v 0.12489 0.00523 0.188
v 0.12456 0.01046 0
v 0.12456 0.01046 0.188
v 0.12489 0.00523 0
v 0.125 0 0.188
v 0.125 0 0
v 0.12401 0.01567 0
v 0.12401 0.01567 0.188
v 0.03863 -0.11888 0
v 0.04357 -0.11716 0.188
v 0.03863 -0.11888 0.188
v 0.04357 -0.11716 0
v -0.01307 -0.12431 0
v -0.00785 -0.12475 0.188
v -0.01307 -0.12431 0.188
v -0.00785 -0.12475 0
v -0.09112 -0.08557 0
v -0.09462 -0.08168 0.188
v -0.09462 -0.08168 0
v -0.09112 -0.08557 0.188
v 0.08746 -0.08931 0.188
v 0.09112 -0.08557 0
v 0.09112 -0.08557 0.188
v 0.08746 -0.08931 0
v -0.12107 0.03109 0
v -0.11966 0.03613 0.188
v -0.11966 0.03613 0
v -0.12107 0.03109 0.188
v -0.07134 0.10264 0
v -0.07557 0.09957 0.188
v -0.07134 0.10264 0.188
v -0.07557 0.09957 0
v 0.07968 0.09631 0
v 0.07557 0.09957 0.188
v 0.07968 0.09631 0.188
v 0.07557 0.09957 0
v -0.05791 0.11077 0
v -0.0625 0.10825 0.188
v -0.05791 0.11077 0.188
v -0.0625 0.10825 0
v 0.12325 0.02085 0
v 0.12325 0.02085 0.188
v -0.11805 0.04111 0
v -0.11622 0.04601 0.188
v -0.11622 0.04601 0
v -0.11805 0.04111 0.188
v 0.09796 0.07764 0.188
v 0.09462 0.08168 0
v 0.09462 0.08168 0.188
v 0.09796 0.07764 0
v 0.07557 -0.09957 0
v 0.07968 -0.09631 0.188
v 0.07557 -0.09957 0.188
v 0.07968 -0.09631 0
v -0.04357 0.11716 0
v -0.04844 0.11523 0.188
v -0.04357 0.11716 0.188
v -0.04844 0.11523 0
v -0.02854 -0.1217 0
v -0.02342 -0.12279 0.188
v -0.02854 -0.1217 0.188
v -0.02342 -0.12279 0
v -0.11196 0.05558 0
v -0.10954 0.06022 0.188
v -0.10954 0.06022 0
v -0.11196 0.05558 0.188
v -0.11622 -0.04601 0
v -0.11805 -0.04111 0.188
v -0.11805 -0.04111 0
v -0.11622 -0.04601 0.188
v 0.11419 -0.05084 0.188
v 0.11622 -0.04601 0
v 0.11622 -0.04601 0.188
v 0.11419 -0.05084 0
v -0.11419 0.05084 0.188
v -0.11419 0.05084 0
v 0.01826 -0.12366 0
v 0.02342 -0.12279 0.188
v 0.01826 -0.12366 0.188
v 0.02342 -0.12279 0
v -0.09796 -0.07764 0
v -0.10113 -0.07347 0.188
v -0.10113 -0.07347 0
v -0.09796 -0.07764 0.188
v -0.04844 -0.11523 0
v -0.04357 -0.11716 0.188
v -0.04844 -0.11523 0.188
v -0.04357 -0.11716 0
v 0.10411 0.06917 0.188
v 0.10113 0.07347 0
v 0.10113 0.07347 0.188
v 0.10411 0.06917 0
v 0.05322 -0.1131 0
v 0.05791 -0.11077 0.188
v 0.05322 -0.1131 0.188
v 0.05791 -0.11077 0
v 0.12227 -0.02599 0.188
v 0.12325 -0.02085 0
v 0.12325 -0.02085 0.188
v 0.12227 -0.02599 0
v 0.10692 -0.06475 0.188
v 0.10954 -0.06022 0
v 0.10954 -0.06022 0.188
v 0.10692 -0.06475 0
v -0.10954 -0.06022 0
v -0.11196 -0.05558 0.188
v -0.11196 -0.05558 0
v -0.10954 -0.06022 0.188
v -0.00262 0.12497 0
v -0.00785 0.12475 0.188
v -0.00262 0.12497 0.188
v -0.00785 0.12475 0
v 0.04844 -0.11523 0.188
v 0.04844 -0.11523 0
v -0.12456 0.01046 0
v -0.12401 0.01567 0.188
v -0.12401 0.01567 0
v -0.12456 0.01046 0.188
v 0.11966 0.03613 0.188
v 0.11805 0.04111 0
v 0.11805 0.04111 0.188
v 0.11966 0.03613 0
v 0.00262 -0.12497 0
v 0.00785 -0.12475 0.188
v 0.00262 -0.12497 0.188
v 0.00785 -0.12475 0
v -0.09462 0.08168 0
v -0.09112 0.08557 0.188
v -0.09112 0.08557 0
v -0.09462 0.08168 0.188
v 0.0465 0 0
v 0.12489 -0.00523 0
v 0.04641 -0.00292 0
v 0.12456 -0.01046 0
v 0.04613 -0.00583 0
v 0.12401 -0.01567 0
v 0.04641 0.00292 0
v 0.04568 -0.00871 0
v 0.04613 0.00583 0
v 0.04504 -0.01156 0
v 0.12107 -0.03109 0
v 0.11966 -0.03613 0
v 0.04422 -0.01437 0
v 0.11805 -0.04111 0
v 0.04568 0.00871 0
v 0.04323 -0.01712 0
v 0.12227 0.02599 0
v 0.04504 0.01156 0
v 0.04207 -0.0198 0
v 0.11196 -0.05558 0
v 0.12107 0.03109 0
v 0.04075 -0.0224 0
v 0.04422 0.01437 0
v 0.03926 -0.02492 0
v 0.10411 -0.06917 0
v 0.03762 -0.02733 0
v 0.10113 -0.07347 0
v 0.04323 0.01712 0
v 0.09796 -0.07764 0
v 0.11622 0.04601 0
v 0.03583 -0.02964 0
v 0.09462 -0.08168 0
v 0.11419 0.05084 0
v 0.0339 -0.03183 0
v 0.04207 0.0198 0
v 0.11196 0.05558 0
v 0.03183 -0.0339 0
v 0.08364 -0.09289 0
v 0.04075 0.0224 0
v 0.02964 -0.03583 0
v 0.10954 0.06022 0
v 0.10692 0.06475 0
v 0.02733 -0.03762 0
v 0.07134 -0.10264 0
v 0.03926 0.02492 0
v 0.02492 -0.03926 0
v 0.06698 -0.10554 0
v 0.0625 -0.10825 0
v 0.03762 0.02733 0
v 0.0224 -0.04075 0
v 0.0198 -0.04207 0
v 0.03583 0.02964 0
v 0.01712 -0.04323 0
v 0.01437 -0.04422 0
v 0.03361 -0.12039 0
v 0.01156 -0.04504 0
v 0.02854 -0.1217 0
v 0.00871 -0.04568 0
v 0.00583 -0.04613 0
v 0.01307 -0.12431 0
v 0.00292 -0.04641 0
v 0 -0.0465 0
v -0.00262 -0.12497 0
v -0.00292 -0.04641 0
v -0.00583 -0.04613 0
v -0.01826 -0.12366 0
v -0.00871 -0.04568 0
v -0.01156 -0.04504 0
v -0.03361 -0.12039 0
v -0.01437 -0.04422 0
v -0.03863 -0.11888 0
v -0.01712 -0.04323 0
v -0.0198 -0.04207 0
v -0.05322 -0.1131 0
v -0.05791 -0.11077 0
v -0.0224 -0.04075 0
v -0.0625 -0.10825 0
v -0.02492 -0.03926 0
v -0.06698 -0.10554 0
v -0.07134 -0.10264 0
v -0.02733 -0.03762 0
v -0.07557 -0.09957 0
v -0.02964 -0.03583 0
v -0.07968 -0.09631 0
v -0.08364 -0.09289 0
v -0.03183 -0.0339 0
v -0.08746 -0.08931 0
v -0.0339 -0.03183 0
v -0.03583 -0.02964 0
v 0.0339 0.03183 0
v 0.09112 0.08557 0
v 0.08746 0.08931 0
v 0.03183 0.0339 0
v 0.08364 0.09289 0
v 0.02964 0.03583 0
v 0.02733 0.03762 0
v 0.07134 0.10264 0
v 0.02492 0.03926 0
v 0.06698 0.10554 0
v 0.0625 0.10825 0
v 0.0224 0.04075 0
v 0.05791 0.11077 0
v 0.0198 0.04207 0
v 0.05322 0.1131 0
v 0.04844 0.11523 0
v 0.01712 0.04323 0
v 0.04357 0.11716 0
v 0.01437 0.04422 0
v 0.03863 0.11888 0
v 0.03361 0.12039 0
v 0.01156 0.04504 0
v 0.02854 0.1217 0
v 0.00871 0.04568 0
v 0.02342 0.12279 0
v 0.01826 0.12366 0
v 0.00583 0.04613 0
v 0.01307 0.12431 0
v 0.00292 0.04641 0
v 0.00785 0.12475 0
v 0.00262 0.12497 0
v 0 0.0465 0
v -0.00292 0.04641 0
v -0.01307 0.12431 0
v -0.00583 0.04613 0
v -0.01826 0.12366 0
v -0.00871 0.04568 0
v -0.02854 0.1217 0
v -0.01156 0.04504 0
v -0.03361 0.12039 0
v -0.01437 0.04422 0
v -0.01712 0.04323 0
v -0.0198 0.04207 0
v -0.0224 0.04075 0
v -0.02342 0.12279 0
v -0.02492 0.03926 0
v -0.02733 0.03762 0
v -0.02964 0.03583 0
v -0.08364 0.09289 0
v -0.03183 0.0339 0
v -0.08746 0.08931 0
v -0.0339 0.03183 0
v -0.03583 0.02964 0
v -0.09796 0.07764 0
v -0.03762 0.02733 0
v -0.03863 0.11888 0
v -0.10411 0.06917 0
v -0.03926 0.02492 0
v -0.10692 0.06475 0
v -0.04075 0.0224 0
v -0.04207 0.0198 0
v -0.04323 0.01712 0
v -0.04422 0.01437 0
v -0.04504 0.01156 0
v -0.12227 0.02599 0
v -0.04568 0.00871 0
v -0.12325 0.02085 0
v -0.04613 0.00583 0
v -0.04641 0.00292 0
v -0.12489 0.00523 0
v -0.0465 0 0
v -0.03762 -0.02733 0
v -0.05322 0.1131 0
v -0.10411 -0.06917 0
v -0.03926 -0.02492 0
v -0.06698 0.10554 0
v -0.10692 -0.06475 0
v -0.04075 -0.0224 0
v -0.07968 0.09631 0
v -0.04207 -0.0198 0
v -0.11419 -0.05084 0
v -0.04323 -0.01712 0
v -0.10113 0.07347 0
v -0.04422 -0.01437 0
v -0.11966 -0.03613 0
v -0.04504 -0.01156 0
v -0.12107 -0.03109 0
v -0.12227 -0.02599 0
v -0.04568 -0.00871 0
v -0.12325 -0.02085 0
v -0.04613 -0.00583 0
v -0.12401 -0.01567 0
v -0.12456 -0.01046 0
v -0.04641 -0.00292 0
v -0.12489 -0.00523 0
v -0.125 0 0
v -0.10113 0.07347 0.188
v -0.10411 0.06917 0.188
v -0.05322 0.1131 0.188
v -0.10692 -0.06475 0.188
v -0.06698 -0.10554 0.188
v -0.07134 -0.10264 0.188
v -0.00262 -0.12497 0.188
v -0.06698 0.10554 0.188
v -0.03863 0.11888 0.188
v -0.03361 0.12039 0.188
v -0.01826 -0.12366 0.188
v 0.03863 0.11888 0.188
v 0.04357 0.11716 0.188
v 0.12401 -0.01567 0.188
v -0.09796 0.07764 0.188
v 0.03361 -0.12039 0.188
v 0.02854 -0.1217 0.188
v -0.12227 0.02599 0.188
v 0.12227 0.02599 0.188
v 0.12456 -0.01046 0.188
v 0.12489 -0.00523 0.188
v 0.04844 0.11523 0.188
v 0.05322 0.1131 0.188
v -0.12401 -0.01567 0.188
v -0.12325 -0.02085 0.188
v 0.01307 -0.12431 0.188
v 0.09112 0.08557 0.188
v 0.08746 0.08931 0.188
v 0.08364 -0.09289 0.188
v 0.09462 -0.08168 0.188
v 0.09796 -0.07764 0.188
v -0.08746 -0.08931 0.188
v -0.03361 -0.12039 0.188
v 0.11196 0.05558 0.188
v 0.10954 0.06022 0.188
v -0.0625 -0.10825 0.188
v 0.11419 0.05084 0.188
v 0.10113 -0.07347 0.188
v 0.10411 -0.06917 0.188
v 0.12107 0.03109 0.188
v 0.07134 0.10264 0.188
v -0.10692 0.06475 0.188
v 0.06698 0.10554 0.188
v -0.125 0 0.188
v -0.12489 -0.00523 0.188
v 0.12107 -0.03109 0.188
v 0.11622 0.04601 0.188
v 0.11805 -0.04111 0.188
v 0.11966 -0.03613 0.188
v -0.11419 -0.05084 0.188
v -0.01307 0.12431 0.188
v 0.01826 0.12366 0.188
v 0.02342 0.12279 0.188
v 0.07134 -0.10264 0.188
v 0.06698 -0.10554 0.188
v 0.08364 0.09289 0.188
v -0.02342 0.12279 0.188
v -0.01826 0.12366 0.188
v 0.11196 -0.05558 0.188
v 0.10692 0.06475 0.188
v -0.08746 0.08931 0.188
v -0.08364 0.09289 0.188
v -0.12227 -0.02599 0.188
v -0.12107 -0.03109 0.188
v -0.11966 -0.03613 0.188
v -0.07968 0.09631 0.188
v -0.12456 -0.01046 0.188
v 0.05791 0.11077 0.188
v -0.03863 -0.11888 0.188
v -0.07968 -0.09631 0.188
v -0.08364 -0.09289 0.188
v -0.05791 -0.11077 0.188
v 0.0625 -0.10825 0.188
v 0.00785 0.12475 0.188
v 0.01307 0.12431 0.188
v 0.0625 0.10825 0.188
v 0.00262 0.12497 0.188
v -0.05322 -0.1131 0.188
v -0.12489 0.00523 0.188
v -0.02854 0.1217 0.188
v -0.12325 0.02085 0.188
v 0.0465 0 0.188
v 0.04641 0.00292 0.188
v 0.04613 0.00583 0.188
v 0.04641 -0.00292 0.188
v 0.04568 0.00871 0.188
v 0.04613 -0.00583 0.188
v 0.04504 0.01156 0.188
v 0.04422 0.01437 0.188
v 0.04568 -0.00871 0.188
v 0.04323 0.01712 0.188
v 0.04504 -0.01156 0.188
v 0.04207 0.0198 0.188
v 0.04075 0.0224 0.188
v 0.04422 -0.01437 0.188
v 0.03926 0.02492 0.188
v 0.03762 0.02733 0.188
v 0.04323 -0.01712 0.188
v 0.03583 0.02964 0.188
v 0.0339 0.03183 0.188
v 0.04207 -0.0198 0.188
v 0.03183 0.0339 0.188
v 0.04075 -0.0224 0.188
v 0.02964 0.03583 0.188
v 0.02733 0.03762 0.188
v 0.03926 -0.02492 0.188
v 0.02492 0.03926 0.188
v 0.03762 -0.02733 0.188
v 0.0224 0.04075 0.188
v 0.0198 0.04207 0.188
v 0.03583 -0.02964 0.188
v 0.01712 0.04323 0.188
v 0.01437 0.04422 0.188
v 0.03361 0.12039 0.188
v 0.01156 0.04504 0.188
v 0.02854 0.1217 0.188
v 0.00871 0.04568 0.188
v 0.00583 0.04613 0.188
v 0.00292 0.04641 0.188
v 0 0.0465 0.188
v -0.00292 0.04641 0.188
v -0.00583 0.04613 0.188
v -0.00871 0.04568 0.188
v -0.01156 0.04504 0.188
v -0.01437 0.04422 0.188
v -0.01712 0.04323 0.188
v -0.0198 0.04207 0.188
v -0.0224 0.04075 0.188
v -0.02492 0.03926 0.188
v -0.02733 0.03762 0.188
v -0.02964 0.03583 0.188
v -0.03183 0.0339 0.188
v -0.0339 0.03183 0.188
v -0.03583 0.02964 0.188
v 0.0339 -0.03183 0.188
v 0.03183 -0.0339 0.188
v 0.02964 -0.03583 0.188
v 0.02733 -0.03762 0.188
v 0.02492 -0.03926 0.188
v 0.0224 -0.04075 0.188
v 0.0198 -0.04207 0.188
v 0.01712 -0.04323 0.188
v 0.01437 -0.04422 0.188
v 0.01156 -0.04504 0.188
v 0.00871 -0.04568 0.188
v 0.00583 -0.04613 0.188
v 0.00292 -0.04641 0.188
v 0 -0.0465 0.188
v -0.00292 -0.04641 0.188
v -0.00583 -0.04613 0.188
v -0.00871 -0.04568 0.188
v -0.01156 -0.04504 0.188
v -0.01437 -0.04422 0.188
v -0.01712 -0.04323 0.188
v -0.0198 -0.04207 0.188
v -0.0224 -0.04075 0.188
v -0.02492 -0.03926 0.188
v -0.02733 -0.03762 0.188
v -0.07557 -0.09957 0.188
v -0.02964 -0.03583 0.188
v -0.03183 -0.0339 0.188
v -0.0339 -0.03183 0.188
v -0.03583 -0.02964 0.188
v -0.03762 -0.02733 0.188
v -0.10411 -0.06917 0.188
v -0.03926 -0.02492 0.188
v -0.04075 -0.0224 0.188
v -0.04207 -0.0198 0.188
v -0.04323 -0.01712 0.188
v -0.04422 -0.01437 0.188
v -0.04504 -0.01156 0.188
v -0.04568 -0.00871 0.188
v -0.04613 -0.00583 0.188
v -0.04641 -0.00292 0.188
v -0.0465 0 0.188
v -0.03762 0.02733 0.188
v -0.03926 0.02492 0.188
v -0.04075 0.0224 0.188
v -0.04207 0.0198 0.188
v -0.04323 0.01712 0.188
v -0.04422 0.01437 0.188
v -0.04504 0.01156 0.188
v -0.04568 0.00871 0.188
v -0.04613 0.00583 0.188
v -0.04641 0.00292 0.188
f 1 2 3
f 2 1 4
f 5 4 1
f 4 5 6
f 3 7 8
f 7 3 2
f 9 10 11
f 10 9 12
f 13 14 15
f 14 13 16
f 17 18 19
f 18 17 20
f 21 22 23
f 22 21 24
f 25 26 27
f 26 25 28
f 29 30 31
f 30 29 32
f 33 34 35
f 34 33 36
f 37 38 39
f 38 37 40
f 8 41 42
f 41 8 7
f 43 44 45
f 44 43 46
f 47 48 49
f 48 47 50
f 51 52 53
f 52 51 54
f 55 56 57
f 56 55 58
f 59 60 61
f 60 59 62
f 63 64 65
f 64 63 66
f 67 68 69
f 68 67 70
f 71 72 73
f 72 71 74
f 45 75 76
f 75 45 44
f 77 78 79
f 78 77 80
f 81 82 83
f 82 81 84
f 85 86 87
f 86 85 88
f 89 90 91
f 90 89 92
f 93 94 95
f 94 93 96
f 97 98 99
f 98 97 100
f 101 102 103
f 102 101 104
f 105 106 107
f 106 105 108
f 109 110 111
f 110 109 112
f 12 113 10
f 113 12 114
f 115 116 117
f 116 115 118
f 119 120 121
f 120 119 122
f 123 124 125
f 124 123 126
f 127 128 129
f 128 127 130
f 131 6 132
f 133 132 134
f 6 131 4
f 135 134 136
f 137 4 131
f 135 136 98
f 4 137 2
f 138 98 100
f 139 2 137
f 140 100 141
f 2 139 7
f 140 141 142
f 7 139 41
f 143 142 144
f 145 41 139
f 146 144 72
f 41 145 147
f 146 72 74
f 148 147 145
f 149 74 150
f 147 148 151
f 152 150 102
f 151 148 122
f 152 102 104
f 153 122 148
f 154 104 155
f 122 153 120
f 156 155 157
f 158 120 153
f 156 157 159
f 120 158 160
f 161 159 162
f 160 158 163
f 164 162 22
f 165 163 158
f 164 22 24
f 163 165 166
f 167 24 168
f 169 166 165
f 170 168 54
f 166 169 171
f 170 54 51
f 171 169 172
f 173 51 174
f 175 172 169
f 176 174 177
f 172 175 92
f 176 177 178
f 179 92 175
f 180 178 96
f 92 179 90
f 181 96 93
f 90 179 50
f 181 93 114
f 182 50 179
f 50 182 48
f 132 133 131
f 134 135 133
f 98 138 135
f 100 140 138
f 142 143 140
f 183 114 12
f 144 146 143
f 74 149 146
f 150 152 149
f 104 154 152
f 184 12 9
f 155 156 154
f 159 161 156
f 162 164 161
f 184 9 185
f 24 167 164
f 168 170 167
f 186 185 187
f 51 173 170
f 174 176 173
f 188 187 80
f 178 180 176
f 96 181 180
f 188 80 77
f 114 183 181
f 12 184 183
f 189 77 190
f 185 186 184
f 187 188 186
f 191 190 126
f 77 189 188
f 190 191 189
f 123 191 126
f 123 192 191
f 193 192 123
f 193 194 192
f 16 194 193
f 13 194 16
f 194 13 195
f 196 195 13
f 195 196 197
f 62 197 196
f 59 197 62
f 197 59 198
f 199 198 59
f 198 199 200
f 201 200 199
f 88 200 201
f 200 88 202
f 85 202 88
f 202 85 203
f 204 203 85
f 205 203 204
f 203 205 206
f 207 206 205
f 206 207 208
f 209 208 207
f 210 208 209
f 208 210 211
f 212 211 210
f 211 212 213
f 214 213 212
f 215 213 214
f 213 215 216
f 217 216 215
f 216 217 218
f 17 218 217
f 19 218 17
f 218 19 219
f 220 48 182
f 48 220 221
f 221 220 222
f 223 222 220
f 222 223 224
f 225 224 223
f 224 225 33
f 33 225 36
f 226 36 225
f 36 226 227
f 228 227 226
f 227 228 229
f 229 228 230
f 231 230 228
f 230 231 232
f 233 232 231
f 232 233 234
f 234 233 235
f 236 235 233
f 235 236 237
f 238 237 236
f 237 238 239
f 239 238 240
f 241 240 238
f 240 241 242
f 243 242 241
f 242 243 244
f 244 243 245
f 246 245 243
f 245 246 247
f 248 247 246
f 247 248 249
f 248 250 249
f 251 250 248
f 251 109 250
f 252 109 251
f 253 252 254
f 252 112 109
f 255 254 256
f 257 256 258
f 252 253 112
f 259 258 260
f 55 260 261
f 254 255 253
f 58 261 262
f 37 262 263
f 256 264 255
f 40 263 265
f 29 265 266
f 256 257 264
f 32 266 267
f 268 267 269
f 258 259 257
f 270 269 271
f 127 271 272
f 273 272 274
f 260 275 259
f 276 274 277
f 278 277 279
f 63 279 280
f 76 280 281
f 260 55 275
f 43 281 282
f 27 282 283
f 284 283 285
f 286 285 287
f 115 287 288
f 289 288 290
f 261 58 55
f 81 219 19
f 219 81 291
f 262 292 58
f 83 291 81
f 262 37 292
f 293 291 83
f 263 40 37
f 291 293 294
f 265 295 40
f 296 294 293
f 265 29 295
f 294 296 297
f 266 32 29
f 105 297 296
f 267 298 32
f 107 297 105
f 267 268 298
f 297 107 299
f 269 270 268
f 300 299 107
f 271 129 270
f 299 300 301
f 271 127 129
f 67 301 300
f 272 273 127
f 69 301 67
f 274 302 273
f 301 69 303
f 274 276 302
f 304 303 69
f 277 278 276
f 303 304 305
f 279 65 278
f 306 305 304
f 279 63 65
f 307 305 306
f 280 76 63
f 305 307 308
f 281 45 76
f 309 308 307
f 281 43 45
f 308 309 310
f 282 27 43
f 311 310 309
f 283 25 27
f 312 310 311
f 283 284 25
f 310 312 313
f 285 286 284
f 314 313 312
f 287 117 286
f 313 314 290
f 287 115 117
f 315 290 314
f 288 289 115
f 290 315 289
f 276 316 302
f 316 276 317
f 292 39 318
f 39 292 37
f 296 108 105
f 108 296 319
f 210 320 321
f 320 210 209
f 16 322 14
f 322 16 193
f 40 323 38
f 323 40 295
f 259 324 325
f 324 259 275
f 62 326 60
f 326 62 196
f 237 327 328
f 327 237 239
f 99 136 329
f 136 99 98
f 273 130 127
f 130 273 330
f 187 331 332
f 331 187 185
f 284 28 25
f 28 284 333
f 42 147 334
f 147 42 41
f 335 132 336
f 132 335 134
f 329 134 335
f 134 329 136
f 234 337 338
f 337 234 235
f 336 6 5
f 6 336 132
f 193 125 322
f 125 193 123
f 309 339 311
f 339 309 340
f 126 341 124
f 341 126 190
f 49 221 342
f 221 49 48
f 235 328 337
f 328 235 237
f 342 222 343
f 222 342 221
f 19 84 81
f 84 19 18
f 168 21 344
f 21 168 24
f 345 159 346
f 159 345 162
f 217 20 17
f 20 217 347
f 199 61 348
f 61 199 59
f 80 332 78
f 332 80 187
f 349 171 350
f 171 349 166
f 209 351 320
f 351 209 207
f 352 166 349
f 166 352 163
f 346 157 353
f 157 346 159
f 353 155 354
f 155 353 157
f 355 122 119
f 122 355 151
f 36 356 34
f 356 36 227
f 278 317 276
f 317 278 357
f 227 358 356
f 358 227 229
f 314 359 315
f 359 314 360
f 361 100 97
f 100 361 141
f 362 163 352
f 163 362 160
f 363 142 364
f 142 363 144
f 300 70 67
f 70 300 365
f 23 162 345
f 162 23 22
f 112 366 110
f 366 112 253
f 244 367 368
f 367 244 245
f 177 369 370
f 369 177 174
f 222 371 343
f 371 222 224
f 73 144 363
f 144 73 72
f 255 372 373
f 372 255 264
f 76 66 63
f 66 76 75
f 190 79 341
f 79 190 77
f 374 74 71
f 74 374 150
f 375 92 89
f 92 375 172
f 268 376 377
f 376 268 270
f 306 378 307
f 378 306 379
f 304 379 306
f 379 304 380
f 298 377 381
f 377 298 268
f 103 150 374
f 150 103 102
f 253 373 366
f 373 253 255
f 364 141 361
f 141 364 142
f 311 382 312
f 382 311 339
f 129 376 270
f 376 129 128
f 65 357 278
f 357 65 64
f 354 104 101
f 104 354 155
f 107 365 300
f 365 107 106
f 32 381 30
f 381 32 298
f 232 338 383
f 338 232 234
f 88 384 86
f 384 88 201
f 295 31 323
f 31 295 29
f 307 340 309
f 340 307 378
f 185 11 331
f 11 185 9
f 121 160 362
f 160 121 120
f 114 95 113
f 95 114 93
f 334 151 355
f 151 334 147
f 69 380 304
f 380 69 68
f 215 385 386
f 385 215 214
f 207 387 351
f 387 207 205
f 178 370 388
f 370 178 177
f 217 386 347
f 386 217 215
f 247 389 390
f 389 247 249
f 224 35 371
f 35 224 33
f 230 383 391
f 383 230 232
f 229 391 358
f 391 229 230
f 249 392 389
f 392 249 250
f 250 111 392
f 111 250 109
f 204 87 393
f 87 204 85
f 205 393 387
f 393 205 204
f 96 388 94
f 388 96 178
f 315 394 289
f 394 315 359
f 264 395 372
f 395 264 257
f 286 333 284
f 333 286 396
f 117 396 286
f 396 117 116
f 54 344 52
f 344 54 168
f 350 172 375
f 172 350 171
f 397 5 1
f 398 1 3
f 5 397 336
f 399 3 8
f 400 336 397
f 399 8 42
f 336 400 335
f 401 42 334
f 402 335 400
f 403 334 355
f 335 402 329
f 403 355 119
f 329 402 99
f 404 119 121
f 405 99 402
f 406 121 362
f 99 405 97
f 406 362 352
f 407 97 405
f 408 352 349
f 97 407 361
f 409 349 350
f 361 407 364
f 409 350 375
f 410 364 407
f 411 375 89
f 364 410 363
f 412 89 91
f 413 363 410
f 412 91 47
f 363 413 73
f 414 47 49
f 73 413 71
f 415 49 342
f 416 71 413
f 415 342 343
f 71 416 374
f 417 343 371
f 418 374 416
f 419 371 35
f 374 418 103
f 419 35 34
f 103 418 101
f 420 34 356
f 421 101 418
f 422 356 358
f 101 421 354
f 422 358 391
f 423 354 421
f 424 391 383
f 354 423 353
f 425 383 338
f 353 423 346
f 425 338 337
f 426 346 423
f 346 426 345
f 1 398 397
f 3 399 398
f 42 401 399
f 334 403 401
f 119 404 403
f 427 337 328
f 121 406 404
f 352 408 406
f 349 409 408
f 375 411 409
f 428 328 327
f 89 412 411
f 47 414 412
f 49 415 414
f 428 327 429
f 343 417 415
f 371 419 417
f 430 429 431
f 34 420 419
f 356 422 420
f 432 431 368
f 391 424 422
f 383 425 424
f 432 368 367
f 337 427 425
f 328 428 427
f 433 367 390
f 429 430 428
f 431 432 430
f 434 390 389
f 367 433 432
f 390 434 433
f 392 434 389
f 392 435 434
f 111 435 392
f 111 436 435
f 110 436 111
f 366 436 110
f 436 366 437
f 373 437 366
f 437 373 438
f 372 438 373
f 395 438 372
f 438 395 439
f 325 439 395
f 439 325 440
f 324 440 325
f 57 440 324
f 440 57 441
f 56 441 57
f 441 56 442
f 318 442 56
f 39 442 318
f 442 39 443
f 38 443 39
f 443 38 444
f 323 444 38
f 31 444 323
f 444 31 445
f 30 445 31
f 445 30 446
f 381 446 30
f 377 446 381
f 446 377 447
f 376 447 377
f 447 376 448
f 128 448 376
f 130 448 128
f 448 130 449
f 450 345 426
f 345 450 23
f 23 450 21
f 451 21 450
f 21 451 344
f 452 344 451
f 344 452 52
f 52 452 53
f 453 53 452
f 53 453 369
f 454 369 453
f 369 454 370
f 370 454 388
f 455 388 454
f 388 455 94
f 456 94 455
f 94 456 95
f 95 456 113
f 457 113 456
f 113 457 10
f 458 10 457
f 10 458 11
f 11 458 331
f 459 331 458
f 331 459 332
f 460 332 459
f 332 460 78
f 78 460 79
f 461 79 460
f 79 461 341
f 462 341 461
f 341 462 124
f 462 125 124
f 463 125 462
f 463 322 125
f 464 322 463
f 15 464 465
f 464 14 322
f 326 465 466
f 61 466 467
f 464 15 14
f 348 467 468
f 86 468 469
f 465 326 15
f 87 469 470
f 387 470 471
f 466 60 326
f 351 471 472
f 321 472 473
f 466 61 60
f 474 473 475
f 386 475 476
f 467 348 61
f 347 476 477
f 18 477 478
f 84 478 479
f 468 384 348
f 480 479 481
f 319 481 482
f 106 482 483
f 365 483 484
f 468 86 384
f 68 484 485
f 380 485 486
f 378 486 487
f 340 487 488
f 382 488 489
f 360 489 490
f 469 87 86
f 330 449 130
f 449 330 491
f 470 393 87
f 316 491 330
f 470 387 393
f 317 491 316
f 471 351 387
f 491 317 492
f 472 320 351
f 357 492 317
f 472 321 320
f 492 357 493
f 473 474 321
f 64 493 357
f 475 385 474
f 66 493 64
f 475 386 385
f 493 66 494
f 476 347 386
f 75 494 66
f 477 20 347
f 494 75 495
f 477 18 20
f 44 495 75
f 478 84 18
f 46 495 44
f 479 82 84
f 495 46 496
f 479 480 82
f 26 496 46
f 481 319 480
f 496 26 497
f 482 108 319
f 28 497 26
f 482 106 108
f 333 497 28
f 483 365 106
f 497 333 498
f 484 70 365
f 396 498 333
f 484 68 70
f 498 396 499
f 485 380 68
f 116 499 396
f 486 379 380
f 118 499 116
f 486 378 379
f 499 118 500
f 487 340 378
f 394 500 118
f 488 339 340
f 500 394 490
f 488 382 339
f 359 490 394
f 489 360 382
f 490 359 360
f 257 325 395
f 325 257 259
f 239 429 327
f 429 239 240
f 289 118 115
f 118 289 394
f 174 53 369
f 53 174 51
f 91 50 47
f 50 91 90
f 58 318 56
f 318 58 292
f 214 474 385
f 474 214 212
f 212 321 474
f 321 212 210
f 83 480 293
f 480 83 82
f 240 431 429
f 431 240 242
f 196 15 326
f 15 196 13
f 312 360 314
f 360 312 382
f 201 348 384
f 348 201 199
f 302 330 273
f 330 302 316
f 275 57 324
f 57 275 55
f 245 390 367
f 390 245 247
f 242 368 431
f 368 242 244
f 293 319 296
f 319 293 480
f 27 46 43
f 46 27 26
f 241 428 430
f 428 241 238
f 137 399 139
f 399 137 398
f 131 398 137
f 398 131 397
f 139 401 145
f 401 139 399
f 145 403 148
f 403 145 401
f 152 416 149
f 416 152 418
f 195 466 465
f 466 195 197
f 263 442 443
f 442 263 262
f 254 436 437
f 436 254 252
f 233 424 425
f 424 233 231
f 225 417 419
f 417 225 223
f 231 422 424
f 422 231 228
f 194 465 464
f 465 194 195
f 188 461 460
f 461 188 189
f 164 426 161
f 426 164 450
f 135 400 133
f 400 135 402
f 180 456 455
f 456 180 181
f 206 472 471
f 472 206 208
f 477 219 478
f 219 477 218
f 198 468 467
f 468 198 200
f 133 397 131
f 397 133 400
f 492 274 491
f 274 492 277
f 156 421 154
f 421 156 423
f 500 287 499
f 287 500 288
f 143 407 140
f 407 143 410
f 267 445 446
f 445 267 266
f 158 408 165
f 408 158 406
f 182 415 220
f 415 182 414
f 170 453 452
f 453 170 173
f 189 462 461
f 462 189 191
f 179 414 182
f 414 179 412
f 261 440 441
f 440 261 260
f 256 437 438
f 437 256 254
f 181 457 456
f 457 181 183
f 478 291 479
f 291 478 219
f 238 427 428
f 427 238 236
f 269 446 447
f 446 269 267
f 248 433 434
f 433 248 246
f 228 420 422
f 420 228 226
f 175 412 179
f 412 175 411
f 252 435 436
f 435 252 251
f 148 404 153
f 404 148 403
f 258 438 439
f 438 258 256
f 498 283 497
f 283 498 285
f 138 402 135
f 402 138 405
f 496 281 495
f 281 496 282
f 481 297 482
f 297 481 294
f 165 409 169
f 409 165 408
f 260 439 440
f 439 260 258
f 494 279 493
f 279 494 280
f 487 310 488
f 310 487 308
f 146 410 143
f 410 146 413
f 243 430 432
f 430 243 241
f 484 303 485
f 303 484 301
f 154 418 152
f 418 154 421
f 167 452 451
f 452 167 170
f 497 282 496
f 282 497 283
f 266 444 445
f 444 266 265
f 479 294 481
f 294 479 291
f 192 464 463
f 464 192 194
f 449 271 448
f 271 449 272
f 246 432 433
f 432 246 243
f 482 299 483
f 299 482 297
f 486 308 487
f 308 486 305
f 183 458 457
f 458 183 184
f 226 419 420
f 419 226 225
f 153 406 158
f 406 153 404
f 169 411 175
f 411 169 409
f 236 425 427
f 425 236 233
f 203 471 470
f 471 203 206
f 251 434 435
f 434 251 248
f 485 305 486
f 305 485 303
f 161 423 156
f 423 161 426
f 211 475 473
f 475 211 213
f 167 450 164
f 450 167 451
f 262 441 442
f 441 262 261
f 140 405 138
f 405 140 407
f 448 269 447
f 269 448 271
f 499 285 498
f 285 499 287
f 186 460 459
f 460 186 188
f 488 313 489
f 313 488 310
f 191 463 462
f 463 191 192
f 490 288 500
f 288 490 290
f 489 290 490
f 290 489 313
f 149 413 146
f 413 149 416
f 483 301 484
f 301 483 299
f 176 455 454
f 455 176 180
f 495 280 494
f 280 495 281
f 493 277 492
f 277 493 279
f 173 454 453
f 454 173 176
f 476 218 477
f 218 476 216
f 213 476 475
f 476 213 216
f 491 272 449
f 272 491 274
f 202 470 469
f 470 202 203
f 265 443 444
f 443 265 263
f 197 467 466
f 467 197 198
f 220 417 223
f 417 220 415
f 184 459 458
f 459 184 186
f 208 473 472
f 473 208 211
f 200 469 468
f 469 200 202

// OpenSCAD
// Gear32
//
// Tooth spacing 2.500 mm
// Contact angle 20 degrees
// Addendum 0.250 mm
// Diametric pitch 1.257 1/mm
// Pitch diameter 25.465 mm
// Overall diameter 26.56 mm
// Shaft spacing 19.099 mm (to 16 tooth gear)

drawingPositionIN = 20/25.4;

difference() {
  union () {
    // Gear body
    translate([-drawingPositionIN, -drawingPositionIN, 0])
      linear_extrude(height = 0.125, center = false, convexity = 25, slices = 5)
                     import(file = "Gears32and16.dxf", scale = 1/25.4, layer="Gear32");

    // Gear hub
    translate([0, 0, 0])
      cylinder(h = 0.188, d = 0.250, center = false, $fn = 150);
  }

  // idle bar hole
  cylinder(h = 2.0, d = 0.093, center = true, $fn = 100);
}
